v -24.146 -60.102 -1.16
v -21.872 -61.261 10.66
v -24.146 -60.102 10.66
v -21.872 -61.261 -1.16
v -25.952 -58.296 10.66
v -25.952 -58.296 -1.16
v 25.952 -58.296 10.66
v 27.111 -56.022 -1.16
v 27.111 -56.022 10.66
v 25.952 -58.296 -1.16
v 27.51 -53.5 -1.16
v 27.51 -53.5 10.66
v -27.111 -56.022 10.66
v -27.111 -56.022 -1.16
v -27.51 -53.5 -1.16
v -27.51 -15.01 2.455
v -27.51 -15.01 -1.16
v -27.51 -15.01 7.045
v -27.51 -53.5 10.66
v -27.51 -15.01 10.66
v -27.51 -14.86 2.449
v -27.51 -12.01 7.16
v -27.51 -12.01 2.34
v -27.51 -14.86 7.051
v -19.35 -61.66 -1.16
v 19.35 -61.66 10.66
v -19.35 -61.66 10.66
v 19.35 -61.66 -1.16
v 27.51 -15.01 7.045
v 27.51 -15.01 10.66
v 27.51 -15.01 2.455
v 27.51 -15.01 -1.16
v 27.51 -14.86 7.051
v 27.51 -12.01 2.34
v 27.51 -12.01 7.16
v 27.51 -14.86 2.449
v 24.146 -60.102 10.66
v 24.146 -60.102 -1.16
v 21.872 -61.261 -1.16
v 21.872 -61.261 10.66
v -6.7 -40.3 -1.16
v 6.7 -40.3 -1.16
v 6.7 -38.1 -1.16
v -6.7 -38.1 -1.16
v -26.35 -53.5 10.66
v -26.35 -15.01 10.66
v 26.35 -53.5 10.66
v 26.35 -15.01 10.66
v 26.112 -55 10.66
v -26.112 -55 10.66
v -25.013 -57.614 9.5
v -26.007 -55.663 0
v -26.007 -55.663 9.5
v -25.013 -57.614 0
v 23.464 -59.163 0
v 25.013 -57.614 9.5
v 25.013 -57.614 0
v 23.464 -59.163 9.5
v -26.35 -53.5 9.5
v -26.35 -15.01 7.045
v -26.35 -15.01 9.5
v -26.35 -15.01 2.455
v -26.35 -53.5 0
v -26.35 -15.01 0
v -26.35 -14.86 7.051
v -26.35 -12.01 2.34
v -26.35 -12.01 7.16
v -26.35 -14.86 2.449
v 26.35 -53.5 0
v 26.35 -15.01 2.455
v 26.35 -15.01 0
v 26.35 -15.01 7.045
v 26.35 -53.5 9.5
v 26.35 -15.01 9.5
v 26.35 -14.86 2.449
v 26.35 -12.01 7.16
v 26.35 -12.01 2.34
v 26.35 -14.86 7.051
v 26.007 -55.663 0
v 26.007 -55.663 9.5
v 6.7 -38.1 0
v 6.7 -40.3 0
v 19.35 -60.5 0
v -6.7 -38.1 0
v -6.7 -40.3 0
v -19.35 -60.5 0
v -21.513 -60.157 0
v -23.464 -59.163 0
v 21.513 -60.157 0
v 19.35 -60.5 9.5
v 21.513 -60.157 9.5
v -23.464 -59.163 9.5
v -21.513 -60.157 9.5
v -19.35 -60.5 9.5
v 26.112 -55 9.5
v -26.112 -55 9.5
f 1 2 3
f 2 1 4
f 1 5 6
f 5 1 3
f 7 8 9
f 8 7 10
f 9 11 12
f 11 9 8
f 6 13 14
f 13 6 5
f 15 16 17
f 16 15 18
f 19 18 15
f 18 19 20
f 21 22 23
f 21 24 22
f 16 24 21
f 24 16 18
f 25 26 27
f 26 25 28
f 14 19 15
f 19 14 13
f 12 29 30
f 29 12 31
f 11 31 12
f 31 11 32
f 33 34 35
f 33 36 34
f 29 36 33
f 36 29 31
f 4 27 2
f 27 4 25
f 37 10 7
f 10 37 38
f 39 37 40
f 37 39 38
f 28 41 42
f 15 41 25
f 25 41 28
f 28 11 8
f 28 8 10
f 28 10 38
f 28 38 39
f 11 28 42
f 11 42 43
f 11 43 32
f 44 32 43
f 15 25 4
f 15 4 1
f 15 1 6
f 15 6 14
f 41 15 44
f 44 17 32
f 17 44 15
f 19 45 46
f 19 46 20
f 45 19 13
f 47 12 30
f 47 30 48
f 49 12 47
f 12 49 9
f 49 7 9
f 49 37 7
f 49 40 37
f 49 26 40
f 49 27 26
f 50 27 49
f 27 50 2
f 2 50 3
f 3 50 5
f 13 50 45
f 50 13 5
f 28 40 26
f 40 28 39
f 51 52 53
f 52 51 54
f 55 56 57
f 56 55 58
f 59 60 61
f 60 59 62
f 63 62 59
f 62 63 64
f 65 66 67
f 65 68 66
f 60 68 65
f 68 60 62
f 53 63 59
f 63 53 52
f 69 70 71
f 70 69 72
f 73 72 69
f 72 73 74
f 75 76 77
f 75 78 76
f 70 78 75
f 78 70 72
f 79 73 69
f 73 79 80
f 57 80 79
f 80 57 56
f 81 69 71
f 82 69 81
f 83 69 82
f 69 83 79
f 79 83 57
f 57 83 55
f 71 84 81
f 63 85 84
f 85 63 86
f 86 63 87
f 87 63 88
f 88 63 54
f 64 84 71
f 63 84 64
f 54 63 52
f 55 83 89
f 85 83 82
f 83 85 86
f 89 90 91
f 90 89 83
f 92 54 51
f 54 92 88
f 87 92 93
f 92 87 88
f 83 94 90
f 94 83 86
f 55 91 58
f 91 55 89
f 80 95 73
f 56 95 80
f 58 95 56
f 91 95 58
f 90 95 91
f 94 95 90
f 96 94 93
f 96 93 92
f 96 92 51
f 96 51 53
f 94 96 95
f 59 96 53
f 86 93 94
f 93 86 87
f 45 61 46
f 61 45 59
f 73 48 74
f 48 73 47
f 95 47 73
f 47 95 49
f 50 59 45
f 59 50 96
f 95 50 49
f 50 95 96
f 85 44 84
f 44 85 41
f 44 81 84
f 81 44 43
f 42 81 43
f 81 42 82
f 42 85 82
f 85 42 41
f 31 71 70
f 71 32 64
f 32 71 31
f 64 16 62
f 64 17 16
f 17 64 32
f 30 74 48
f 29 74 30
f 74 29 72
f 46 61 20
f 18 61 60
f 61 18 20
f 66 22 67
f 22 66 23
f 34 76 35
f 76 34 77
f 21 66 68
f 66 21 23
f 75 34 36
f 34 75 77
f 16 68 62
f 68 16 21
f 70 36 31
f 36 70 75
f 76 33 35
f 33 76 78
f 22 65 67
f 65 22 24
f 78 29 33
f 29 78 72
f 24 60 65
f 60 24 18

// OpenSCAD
$fn = 20;

phone_x = 52.7;
phone_y = 121;
phone_z = 9.5;
corner_radius = 7;

slack = 0.16;
case_width = 1;

below_buttons = 5.5;
above_buttons = 8.5;
buttons_height = 45.5;

screen_x = 45;
screen_y = 59;

cutoff_size = 5;

camera_radius = 4.1;
camera_from_top = 12.3;

front_speaker_x = 10;
front_speaker_y = 1.6;
front_speaker_from_top = 4.2;

rear_speaker_x = 13.4;
rear_speaker_y = 2.2;
rear_speaker_from_bottom = 20.2;

top_hole_x = 33;
top_hole_z = 5; 
top_hole_from_bottom = 3;

snap_height = 3;
snap_factor = 1.05;

// ------------------------

// How much bigger is the case
case_diff = 2 * (slack + case_width);

module rounded_rect(x, y, radius) {
    hull() {
        translate([-x/2+radius, -y/2+radius, 0])
        circle(radius);
        
        translate([x/2-radius, -y/2+radius, 0])
        circle(radius);
        
        translate([-x/2+radius, y/2-radius, 0])
        circle(radius);
        
        translate([x/2-radius, y/2-radius, 0])
        circle(radius);
    }
}

module buttons() {
    linear_extrude(height = 100)
    difference() {
        rounded_rect(phone_x, phone_y, corner_radius);
        
        translate([-500, -phone_y/2 + buttons_height, 0])
        square([1000, 1000]);
        
        translate([-500, -1000-phone_y/2 + below_buttons, 0])
        square([1000, 1000]);
    }
}

module screen() {
    linear_extrude(height = 100)
    translate([-screen_x/2, -phone_y/2 + buttons_height + above_buttons])
    square([screen_x, screen_y]);
}


module top_cutoff() {
    translate([-phone_x/2, 0, 0])
    cube([phone_x + slack, 1000, phone_z + slack]);
}

module camera() {
    translate([0, phone_y/2 - camera_from_top, -1000 + phone_z/2])
    linear_extrude(height=1000)
    circle(camera_radius);
}

module front_speaker() {
    translate([-front_speaker_x/2, phone_y/2-front_speaker_from_top, phone_z/2])
    linear_extrude(height=1000)
    square([front_speaker_x, front_speaker_y]);
}

module rear_speaker() {
    translate([-rear_speaker_x/2, -phone_y/2+rear_speaker_from_bottom, -1000 + phone_z/2])
    linear_extrude(height = 1000)
    square([rear_speaker_x, rear_speaker_y]);
}

module phone() {
    linear_extrude(height = phone_z)
    rounded_rect(phone_x, phone_y, corner_radius);
}

module top_hole() {
    translate([0, 0, top_hole_from_bottom])
    rotate([-90, 0, 0])
    linear_extrude(height=100)
    hull() {
        translate([-top_hole_x/2, 0, 0])
        circle(d = top_hole_z);
        
        translate([top_hole_x/2, 0, 0])
        circle(d = top_hole_z);
    }
}

module case() {
    translate([0, 0, -case_diff/2])
        linear_extrude(height = phone_z + case_diff)
        rounded_rect(phone_x + case_diff, phone_y + case_diff, corner_radius + case_diff/2);
}

module full_case() {
    difference() {
        case();

        phone();
        buttons();
        screen();
        top_hole();
        camera();
        front_speaker();
        rear_speaker();
    }
}



module three_part_case_top() {
    difference() {
        full_case();
        
        snapper_female_mask();
    }
}

module three_part_case_middle() {
    difference() {
        full_case();
        
        translate([0, -above_buttons, 0])
        snapper_female_mask();
        
        snapper_male_mask();
    }
}

module three_part_case_bottom() {
    difference() {
        full_case();
        
        translate([0, -above_buttons-0.01, 0])
        snapper_male_mask();
    }
}


module snapper_male() {
    linear_extrude(height = snap_height, scale = [1, snap_factor])
            square([phone_x+case_diff, phone_z/2-slack], center = true);
}

module snapper_female() {
    linear_extrude(height = snap_height, scale = [1, snap_factor])
        square([phone_x*2, phone_z/2], center = true);
}

module snapper_female_mask() {
    union() {
        translate([0, -phone_y/2 + buttons_height + above_buttons + snap_height/2, phone_z / 2])
        rotate([-90, 0, 0])
        translate([0, 0, -snap_height/2])
        snapper_female();
        
        translate([0, -phone_y -phone_y/2 + buttons_height + above_buttons + 0.01, 0])
        cube(size=phone_y*2, center = true);
    }
}

module snapper_male_mask() {
    union() {
        difference() {
            translate([0, buttons_height + above_buttons])
            cube(size = phone_y, center = true);
            
            translate([0, -phone_y/2 + buttons_height + above_buttons + snap_height/2, phone_z / 2])
            rotate([-90, 0, 0])
            translate([0, 0, -snap_height/2])
            snapper_male();
        }
    }
}

//three_part_case_top();
//three_part_case_middle();
three_part_case_bottom();
